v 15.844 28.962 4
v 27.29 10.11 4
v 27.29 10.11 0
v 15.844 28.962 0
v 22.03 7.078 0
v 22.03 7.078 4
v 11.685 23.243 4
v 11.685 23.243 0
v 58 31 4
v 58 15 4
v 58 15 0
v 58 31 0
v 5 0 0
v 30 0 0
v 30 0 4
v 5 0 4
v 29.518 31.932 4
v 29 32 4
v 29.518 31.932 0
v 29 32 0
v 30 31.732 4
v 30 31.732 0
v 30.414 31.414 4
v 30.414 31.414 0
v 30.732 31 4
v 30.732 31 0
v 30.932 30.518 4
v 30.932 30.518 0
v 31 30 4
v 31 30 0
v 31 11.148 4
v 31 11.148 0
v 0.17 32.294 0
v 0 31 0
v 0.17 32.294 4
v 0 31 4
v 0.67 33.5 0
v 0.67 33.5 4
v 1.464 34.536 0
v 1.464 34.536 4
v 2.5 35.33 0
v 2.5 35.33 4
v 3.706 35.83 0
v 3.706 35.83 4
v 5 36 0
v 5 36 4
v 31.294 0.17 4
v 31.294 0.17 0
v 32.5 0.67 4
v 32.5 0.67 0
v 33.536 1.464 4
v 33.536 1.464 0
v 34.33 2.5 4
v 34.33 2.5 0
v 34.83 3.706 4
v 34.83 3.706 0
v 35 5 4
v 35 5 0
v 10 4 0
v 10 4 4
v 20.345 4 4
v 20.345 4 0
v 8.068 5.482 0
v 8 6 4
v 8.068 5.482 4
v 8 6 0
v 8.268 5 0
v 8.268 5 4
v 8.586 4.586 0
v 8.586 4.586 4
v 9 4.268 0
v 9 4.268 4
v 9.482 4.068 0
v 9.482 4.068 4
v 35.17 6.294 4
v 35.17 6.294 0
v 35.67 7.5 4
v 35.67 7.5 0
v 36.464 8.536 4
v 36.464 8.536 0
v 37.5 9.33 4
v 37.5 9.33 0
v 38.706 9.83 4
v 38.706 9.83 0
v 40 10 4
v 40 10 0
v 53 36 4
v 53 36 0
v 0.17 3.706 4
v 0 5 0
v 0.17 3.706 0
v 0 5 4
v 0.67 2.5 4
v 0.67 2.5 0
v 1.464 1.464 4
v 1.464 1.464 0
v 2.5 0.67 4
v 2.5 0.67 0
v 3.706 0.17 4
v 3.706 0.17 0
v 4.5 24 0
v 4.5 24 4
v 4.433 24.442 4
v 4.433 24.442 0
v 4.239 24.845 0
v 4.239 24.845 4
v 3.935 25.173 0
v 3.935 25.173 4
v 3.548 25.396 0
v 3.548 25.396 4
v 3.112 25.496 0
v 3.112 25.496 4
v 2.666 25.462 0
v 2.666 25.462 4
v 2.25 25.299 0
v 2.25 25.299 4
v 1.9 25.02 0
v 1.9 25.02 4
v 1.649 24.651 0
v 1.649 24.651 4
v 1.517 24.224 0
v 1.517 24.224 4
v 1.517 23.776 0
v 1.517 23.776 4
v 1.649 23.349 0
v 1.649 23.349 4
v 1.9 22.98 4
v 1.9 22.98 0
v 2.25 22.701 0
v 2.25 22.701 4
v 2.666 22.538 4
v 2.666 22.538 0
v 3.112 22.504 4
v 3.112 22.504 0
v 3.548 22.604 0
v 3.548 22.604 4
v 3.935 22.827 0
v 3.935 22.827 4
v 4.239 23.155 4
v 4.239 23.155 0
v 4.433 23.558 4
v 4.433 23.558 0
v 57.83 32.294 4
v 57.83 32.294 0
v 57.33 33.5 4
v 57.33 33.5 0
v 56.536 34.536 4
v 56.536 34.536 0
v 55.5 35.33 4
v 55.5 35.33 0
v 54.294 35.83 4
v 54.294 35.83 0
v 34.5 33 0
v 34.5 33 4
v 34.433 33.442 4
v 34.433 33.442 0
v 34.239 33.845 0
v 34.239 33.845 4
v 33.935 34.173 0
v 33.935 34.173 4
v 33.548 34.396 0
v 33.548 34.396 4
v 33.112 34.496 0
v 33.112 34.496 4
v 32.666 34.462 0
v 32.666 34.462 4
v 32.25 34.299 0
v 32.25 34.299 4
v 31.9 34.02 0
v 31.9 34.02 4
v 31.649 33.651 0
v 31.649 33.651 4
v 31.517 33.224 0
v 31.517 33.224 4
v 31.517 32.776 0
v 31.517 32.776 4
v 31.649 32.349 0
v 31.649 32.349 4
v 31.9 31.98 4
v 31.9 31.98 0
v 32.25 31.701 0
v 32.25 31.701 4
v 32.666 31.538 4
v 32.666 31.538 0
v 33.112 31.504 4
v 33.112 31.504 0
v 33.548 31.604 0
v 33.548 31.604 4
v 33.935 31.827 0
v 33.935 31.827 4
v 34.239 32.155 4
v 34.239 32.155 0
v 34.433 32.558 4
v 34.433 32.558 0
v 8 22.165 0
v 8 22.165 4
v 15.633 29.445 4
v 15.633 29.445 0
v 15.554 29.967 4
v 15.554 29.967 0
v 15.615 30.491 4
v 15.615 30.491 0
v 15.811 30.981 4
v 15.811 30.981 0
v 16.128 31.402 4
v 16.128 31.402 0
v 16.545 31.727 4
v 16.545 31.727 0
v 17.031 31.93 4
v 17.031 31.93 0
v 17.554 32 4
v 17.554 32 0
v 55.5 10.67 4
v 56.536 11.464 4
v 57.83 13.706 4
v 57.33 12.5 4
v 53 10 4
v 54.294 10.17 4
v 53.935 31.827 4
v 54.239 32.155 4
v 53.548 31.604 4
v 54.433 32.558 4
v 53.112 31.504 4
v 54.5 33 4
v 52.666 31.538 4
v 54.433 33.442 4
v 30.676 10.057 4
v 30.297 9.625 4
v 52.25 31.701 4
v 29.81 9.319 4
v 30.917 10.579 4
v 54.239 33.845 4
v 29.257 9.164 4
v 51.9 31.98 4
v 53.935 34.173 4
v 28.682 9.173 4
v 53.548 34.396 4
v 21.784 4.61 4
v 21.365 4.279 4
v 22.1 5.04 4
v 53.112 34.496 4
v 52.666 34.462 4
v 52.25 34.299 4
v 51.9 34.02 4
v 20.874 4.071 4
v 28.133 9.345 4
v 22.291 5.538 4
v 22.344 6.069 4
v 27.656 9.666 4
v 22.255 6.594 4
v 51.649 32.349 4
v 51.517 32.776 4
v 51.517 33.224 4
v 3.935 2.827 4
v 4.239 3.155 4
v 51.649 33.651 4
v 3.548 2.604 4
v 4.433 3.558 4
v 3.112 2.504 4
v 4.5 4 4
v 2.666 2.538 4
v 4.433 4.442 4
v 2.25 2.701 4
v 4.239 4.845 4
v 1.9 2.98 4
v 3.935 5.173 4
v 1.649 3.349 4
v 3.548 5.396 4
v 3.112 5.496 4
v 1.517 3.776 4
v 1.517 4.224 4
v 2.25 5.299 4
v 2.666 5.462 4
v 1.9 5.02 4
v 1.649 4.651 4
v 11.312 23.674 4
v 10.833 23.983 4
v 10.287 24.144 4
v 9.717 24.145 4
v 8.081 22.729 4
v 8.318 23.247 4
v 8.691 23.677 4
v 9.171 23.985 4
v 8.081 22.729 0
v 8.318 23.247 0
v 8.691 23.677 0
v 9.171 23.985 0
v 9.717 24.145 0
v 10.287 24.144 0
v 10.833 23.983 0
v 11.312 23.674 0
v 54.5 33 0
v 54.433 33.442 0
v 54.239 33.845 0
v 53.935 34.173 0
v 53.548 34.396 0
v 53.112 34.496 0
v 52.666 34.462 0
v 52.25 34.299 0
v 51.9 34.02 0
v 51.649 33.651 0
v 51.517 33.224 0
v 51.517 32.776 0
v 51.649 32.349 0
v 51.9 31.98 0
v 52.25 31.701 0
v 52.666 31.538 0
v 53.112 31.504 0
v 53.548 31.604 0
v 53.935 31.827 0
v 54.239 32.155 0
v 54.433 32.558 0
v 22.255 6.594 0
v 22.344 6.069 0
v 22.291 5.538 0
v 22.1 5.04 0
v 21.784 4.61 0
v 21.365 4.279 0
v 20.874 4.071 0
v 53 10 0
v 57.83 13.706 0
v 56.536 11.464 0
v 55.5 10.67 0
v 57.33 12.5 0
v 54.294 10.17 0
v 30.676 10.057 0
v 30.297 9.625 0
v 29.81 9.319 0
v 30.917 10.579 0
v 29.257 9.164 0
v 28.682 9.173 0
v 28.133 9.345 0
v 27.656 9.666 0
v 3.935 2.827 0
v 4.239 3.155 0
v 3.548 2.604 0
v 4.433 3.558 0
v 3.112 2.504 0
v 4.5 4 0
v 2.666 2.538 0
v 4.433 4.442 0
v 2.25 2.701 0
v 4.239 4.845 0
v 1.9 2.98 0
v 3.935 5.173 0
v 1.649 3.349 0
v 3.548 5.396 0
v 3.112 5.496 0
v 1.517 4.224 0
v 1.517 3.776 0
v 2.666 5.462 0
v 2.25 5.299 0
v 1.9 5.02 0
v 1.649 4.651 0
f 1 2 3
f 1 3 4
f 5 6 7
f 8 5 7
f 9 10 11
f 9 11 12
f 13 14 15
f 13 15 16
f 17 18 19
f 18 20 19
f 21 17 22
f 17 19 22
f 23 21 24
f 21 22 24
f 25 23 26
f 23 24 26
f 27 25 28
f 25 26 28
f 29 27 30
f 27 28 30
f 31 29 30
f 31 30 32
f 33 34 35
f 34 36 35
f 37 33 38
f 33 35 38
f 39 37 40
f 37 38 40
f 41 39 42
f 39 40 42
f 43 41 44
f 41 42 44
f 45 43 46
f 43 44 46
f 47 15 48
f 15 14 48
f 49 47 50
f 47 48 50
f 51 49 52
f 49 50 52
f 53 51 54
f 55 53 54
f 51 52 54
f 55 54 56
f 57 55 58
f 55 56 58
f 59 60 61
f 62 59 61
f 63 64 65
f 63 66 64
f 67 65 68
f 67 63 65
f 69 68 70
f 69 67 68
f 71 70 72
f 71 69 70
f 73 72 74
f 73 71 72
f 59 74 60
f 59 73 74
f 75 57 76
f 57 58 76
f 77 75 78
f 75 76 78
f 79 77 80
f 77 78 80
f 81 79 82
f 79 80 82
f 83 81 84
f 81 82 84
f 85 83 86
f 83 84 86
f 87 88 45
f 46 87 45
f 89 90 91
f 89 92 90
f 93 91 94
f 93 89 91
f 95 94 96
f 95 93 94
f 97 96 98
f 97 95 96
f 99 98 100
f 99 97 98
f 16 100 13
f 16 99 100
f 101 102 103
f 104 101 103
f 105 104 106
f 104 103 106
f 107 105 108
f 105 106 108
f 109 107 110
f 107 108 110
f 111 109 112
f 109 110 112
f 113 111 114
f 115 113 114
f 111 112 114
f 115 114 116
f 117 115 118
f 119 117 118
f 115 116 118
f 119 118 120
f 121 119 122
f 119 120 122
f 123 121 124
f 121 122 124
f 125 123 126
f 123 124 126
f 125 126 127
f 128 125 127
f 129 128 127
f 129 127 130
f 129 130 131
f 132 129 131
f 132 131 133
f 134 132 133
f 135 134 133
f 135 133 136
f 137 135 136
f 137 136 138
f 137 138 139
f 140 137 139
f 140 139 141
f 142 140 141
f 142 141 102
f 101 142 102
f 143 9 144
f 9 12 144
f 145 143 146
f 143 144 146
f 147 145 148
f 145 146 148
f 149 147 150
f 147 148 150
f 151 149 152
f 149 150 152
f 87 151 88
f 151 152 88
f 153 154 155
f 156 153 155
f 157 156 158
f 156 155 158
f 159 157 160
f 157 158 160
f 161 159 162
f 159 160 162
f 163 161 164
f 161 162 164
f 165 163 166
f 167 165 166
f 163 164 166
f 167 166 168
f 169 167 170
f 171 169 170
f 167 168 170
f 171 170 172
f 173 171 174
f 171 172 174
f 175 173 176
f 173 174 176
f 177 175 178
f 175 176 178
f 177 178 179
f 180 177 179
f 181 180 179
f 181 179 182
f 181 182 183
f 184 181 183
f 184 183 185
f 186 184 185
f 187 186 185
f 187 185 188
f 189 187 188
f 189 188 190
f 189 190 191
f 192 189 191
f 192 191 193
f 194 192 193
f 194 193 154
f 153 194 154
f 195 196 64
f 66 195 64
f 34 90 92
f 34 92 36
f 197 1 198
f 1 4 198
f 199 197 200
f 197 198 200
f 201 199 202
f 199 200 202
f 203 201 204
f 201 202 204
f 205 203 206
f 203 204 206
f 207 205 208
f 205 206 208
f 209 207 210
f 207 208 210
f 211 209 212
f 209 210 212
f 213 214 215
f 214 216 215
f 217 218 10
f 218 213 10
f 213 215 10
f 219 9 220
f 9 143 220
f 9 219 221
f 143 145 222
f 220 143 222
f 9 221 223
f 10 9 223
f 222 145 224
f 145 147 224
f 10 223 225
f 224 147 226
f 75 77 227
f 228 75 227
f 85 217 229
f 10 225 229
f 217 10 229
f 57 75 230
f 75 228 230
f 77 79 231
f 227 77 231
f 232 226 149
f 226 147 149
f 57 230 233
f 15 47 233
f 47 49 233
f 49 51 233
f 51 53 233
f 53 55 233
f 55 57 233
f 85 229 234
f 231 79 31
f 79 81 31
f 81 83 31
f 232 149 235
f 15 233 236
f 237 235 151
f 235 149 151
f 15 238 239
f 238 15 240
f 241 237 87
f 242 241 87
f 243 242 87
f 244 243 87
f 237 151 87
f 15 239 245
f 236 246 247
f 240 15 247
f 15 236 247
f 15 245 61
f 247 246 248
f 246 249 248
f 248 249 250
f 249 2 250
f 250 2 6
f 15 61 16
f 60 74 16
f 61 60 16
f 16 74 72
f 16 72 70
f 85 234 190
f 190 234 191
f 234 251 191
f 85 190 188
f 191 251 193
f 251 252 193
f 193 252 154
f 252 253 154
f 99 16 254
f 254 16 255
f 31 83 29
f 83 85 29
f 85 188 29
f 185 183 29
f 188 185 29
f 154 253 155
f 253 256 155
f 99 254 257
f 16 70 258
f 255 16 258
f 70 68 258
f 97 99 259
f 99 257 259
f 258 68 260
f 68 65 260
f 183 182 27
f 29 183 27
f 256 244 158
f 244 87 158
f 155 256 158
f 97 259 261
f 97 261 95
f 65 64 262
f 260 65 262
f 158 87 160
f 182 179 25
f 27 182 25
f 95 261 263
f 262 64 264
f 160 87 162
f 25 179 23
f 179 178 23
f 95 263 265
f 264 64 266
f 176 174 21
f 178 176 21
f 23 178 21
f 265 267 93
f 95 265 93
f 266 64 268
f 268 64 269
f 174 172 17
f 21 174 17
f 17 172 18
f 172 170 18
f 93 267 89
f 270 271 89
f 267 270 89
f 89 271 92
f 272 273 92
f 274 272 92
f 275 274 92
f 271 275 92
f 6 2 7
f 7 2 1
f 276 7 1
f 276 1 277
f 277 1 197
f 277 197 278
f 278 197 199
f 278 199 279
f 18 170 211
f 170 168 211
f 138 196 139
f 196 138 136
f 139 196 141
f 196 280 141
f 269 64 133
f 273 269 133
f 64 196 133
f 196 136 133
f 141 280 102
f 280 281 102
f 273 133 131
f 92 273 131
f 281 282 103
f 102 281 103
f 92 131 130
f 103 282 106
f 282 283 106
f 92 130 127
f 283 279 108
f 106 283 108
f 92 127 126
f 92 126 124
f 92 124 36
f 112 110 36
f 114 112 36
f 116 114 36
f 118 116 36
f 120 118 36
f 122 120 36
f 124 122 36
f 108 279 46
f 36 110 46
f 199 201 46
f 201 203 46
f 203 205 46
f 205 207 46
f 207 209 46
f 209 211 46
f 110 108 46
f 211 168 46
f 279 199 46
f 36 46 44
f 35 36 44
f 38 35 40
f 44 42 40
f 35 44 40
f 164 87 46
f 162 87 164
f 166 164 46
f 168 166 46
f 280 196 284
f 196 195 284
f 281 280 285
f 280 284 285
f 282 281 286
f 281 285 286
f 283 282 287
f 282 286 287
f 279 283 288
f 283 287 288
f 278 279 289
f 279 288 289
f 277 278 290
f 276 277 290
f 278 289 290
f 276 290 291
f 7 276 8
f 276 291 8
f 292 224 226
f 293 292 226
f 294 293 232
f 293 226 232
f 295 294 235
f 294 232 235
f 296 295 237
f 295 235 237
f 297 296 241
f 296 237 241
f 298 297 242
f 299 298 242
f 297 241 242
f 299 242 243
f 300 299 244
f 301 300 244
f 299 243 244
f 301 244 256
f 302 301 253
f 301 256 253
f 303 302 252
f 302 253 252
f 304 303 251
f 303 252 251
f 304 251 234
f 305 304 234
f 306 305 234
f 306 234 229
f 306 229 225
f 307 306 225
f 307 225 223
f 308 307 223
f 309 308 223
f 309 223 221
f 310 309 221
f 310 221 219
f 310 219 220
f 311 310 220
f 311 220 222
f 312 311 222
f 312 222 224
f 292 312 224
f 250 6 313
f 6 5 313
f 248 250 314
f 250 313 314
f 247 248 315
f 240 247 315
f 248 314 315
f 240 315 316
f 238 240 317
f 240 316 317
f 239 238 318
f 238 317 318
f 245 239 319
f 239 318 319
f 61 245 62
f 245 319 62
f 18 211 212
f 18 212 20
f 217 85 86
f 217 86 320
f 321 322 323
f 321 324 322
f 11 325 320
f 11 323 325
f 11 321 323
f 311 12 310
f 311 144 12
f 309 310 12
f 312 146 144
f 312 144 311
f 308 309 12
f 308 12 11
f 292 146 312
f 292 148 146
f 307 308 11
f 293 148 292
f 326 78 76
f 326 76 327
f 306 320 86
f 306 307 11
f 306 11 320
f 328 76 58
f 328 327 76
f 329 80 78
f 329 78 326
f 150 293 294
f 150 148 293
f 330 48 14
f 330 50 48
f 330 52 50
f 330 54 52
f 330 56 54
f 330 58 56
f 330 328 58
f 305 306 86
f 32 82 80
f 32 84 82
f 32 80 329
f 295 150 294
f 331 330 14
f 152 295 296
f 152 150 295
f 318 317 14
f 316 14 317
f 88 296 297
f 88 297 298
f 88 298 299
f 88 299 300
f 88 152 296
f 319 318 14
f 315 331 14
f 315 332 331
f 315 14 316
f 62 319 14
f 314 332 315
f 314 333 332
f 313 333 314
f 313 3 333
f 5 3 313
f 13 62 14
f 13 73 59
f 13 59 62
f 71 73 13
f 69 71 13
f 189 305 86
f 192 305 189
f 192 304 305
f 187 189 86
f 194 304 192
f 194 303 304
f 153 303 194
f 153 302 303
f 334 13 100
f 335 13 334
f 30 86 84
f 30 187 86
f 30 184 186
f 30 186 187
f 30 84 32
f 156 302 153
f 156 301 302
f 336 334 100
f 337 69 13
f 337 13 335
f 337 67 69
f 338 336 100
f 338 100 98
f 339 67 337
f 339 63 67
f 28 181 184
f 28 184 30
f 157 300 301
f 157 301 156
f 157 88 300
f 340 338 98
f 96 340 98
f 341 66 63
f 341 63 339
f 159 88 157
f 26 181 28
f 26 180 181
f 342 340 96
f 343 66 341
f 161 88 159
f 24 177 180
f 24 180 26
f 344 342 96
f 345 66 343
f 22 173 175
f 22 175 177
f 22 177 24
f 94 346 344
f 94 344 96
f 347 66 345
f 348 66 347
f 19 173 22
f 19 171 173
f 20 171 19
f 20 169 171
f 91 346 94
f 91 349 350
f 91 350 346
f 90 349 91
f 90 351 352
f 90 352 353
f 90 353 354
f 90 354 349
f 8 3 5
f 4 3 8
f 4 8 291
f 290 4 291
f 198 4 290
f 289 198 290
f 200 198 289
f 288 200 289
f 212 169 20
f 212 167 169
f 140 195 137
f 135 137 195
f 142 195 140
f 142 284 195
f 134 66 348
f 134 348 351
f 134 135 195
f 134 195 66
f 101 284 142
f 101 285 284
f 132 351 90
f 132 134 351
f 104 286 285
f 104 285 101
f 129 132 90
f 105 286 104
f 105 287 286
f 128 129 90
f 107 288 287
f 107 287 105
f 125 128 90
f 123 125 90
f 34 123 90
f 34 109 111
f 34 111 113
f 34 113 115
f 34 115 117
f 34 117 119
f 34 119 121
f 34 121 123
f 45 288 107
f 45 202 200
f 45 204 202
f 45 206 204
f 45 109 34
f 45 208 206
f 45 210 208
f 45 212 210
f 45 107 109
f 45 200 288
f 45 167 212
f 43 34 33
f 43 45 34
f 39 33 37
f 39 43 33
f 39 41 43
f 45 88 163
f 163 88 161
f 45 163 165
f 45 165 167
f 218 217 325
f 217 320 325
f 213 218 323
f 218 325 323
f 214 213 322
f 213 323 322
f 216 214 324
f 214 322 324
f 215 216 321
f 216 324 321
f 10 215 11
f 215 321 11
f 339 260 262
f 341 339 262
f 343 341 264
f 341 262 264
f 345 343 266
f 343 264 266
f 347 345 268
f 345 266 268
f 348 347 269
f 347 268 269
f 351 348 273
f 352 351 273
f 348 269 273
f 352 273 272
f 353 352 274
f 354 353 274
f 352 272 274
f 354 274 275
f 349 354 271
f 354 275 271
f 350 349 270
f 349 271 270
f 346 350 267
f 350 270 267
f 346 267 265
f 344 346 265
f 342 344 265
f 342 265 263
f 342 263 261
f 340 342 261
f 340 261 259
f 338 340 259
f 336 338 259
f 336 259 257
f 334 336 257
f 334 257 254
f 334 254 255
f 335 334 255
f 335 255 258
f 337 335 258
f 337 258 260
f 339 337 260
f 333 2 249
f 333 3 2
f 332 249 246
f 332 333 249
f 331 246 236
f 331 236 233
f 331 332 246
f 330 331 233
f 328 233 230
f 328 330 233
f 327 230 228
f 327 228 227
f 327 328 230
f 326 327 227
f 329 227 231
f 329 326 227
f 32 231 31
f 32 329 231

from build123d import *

# Parameters (mm, degrees)
EXTRUDE_2_DEPTH      = 4
SKETCH_2_R           = 1.5
CUT_EXTRUDE_1_DEPTH  = 10
SKETCH_4_W           = 100
SKETCH_4_H           = 10
CUT_EXTRUDE_2_DEPTH  = 10
FILLET_1_R           = 5
SKETCH_5_R           = 1.5
CUT_EXTRUDE_3_DEPTH  = 6
SKETCH_7_W           = 4
SKETCH_7_H           = 25.94
EXTRUDE_3_DEPTH      = 2
FILLET_5_R           = 1
SKETCH_9_R           = 1.5
CUT_EXTRUDE_6_DEPTH  = 10
SKETCH_13_R          = 1.5
CUT_EXTRUDE_8_DEPTH  = 10
CUT_EXTRUDE_9_DEPTH  = 4
FILLET_9_R           = 2
SKETCH_15_W          = 4
SKETCH_15_H          = 25.94
CUT_EXTRUDE_12_DEPTH = 10
SKETCH_16_W          = 77
SKETCH_16_H          = 26
CUT_EXTRUDE_13_DEPTH = 10
FILLET_10_R          = 5


with BuildPart() as part:
    # 草图1 → 凸台-拉伸2 (new body)
    with BuildSketch(Plane.XY):
        Polygon((0, 0), (0, 36), (35, 36), (135, 36), (135, 16.447466896), (135, 0), align=None)
    extrude(amount=EXTRUDE_2_DEPTH)

    # 草图2 → 切除-拉伸1 (cut)
    with BuildSketch(Plane.XY.offset(4)):
        with Locations((3, 4)):
            Circle(SKETCH_2_R)
        with Locations((3, 24)):
            Circle(SKETCH_2_R)
    extrude(amount=-CUT_EXTRUDE_1_DEPTH, mode=Mode.SUBTRACT)

    # 草图4 → 切除-拉伸2 (cut)
    with BuildSketch(Plane.XY.offset(4)):
        with Locations((85, 5)):
            Rectangle(SKETCH_4_W, SKETCH_4_H)
    extrude(amount=-CUT_EXTRUDE_2_DEPTH, mode=Mode.SUBTRACT)

    # 圆角1
    fillet_1_edges = [part.edges().sort_by_distance(p)[0] for p in [
        (35, 10, 2),
        (135, 10, 2),
        (135, 36, 2),
        (0, 36, 2),
        (0, 0, 2),
        (35, 0, 2),
    ]]
    fillet(fillet_1_edges, radius=FILLET_1_R - 0.0001)  # a hair under: the kernel refuses the full size

    # 草图5 → 切除-拉伸3 (cut)
    with BuildSketch(Plane.XY.offset(4)):
        with Locations((97.5, 33)):
            Circle(SKETCH_5_R)
        with Locations((53, 33)):
            Circle(SKETCH_5_R)
        with Locations((77.5, 33)):
            Circle(SKETCH_5_R)
    extrude(amount=-CUT_EXTRUDE_3_DEPTH, mode=Mode.SUBTRACT)

    # 草图7 → 凸台-拉伸3 (add)
    with BuildSketch(Plane.XY.offset(4)):
        with Locations((-2, 18)):
            Rectangle(SKETCH_7_W, SKETCH_7_H)
    extrude(amount=-EXTRUDE_3_DEPTH)

    # 圆角5
    fillet_5_edges = [part.edges().sort_by_distance(p)[0] for p in [
        (-4, 5.03, 3),
        (-4, 30.97, 3),
    ]]
    fillet(fillet_5_edges, radius=FILLET_5_R)

    # 草图9 → 切除-拉伸6 (cut)
    with BuildSketch(Plane.XY.offset(4)):
        with Locations((110, 17)):
            Circle(SKETCH_9_R)
    extrude(amount=-CUT_EXTRUDE_6_DEPTH, mode=Mode.SUBTRACT)

    # 草图13 → 切除-拉伸8 (cut)
    with BuildSketch(Plane.XY.offset(4)):
        with Locations((33, 33)):
            Circle(SKETCH_13_R)
    extrude(amount=-CUT_EXTRUDE_8_DEPTH, mode=Mode.SUBTRACT)

    # 草图11 → 切除-拉伸9 (cut)
    with BuildSketch(Plane.XY.offset(4)):
        Polygon((31, 4), (14, 32), (31, 32), align=None)
        Polygon((8, 4), (24, 4), (8, 29), align=None)
    extrude(amount=-CUT_EXTRUDE_9_DEPTH, mode=Mode.SUBTRACT)

    # 圆角9
    fillet_9_edges = [part.edges().sort_by_distance(p)[0] for p in [
        (8, 29, 2),
        (8, 4, 2),
        (24, 4, 2),
        (31, 4, 2),
        (14, 32, 2),
        (31, 32, 2),
    ]]
    fillet(fillet_9_edges, radius=FILLET_9_R)

    # 草图15 → 切除-拉伸12 (cut)
    with BuildSketch(Plane.XY.offset(4)):
        with Locations((-2, 18)):
            Rectangle(SKETCH_15_W, SKETCH_15_H)
    extrude(amount=-CUT_EXTRUDE_12_DEPTH, mode=Mode.SUBTRACT)

    # 草图16 → 切除-拉伸13 (cut)
    with BuildSketch(Plane.XY.offset(4)):
        with Locations((96.5, 23)):
            Rectangle(SKETCH_16_W, SKETCH_16_H)
    extrude(amount=-CUT_EXTRUDE_13_DEPTH, mode=Mode.SUBTRACT)

    # 圆角10
    fillet_10_edges = [part.edges().sort_by_distance(p)[0] for p in [
        (58, 36, 2),
        (58, 10, 2),
    ]]
    fillet(fillet_10_edges, radius=FILLET_10_R)


solid = part.part
